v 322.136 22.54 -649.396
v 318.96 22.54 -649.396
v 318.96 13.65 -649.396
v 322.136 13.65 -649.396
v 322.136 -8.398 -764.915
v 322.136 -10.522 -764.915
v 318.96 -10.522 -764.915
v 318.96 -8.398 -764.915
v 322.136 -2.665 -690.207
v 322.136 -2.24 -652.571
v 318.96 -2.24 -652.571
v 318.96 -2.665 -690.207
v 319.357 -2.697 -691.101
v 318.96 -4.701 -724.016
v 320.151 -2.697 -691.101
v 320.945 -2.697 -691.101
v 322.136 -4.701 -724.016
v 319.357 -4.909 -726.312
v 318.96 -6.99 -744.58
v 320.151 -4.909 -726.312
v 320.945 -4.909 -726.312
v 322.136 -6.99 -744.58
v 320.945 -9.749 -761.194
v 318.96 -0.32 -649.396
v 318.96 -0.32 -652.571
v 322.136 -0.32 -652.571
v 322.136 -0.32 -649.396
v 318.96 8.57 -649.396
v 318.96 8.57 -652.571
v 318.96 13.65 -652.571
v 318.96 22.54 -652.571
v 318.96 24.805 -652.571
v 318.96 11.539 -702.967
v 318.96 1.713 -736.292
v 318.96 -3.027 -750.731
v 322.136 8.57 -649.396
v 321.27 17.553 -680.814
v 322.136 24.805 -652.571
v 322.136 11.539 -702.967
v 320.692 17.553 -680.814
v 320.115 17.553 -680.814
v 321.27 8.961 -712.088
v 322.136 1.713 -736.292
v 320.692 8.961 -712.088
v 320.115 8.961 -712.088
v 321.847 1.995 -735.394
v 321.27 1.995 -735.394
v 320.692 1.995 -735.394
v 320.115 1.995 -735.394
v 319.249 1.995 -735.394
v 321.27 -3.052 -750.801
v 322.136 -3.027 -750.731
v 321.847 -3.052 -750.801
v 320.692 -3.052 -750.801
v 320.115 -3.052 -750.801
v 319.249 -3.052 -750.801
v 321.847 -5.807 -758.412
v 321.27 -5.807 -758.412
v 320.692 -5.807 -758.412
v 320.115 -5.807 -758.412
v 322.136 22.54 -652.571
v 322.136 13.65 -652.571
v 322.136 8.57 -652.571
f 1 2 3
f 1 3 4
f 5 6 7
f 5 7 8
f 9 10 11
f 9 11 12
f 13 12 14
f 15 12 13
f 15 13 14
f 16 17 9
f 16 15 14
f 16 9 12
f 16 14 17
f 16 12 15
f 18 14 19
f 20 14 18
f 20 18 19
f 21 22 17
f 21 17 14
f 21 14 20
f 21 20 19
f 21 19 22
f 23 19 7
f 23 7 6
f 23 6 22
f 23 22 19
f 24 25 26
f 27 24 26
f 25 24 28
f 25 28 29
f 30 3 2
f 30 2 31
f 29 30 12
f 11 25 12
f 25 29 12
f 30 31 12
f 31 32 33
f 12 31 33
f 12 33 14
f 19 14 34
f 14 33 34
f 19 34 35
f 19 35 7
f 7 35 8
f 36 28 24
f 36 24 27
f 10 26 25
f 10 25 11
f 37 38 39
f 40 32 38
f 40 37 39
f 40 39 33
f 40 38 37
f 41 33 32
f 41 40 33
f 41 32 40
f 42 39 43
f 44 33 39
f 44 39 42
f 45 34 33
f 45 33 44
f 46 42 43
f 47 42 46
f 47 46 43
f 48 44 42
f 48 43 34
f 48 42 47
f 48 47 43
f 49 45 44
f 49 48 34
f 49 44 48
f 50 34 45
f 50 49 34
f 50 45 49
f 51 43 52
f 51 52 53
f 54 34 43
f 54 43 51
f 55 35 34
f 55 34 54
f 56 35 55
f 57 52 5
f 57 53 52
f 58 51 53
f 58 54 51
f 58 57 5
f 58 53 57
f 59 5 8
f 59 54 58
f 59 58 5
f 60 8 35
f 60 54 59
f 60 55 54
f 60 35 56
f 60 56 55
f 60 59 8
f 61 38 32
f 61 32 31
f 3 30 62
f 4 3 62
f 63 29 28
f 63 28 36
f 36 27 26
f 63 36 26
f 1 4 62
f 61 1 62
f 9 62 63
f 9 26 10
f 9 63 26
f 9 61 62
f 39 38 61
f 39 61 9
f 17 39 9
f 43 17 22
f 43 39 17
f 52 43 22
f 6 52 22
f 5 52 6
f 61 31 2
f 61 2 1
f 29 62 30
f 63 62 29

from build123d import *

# Parameters (mm, degrees)
BOSS_EXTRUDE1_DEPTH = 3.175
CUT_EXTRUDE1_DEPTH  = 3.175
SKETCH3_W           = 3.175
SKETCH3_H           = 8.89
BOSS_EXTRUDE3_DEPTH = 3.175


with BuildPart() as part:
    # Sketch1 → Boss-Extrude1 (new body)
    with BuildSketch(Plane(origin=(322.1355, 0, 0), x_dir=(0, 0, -1), z_dir=(1, 0, 0))):
        with BuildLine():
            Line((652.571489798, 25.444691841), (652.571489798, -2.239853871))
            add(Edge.make_bspline(
                [(652.571489798, -2.239853871), (659.535508053, -2.166526792), (666.500386762, -2.172540218), (679.343468905, -2.343824355), (685.222739923, -2.485063976), (696.978954297, -2.909271923), (702.85456416, -3.191578316), (714.592323323, -3.919191383), (720.455505411, -4.364295636), (729.239801176, -5.181453913), (732.167256327, -5.479520855), (738.010202726, -6.135780349), (740.925935315, -6.494041299), (749.652482821, -7.677212837), (755.443511526, -8.605976907), (762.435970423, -9.996546686), (763.676377356, -10.253772029), (764.914772229, -10.521558234)],
                knots=[0.775497337, 0.775497337, 0.775497337, 0.775497337, 0.8125, 0.8125, 0.84375, 0.84375, 0.875, 0.875, 0.90625, 0.90625, 0.921875, 0.921875, 0.9375, 0.9375, 0.96875, 0.96875, 0.975501731, 0.975501731, 0.975501731, 0.975501731], degree=3))
            Line((764.914772229, -10.521558234), (764.914772229, -7.95557204))
            add(Edge.make_bspline(
                [(764.914772229, -7.95557204), (762.592495307, -6.961678807), (760.248039666, -6.021012379), (755.381001417, -4.157972035), (752.855549055, -3.242485253), (747.781003843, -1.468246605), (745.231905095, -0.60950889), (737.561144422, 1.91039187), (732.426406495, 3.521427695), (722.132037513, 6.655448313), (716.971446899, 8.176495188), (706.629978042, 11.149031985), (701.449248475, 12.601031652), (691.072587644, 15.45291135), (685.876480278, 16.853200873), (671.324621162, 20.706496058), (661.956512682, 23.109383547), (652.571489798, 25.444691841)],
                knots=[0.066165924, 0.066165924, 0.066165924, 0.066165924, 0.125, 0.125, 0.1875, 0.1875, 0.25, 0.25, 0.375, 0.375, 0.5, 0.5, 0.625, 0.625, 0.75, 0.75, 0.974669525, 0.974669525, 0.974669525, 0.974669525], degree=3))
        make_face()
    extrude(amount=-BOSS_EXTRUDE1_DEPTH)

    # Sketch2 → Cut-Extrude1 (cut)
    with BuildSketch(Plane.ZY.offset(-318.9605)):
        with BuildLine():
            Line((-649.396489798, 25.593288016), (-650.006698592, 28.058900562))
            add(Edge.make_bspline(
                [(-650.006698592, 28.058900562), (-660.51321247, 25.45866754), (-681.483078121, 20.093474052), (-707.597104431, 12.962630416), (-728.392690314, 6.856018534), (-743.920155817, 2.015224435), (-756.792636164, -2.379192874), (-766.929271878, -6.418935387), (-771.93415167, -8.70689296), (-774.395298331, -9.920762993)],
                knots=[0, 0, 0, 0, 0.25, 0.5, 0.625, 0.75, 0.875, 0.9375, 1, 1, 1, 1], degree=3))
            Line((-774.395298331, -9.920762993), (-773.271760863, -12.198758506))
            add(Edge.make_bspline(
                [(-649.396489798, 25.593288016), (-659.890092199, 22.996250426), (-670.36307543, 20.318524911), (-686.038941126, 16.170415704), (-691.258573313, 14.76557782), (-701.684945224, 11.905450655), (-706.891809106, 10.449729715), (-717.284977007, 7.471750728), (-722.471467171, 5.948931584), (-730.231305632, 3.598018149), (-732.814554878, 2.803107207), (-737.973199119, 1.186961553), (-740.549325052, 0.366607699), (-745.688759805, -1.3098747), (-748.250861629, -2.166692715), (-753.351930275, -3.936762543), (-755.890796198, -4.850260484), (-760.932732715, -6.76457283), (-763.436647752, -7.763327362), (-767.155712151, -9.351246242), (-768.389182844, -9.895718895), (-770.8414182, -11.020536997), (-772.060077224, -11.601140135), (-773.271760863, -12.198758506)],
                knots=[0, 0, 0, 0, 0.25, 0.25, 0.375, 0.375, 0.5, 0.5, 0.625, 0.625, 0.6875, 0.6875, 0.75, 0.75, 0.8125, 0.8125, 0.875, 0.875, 0.9375, 0.9375, 0.96875, 0.96875, 1, 1, 1, 1], degree=3))
        make_face()
    extrude(amount=-CUT_EXTRUDE1_DEPTH, mode=Mode.SUBTRACT)

    # Sketch3 → Boss-Extrude3 (add)
    with BuildSketch(Plane.XY.offset(-652.571489798)):
        with Locations((320.548, 18.094665768)):
            Rectangle(SKETCH3_W, SKETCH3_H)
        with Locations((320.548, 4.124665768)):
            Rectangle(SKETCH3_W, SKETCH3_H)
    extrude(amount=BOSS_EXTRUDE3_DEPTH)


solid = part.part
